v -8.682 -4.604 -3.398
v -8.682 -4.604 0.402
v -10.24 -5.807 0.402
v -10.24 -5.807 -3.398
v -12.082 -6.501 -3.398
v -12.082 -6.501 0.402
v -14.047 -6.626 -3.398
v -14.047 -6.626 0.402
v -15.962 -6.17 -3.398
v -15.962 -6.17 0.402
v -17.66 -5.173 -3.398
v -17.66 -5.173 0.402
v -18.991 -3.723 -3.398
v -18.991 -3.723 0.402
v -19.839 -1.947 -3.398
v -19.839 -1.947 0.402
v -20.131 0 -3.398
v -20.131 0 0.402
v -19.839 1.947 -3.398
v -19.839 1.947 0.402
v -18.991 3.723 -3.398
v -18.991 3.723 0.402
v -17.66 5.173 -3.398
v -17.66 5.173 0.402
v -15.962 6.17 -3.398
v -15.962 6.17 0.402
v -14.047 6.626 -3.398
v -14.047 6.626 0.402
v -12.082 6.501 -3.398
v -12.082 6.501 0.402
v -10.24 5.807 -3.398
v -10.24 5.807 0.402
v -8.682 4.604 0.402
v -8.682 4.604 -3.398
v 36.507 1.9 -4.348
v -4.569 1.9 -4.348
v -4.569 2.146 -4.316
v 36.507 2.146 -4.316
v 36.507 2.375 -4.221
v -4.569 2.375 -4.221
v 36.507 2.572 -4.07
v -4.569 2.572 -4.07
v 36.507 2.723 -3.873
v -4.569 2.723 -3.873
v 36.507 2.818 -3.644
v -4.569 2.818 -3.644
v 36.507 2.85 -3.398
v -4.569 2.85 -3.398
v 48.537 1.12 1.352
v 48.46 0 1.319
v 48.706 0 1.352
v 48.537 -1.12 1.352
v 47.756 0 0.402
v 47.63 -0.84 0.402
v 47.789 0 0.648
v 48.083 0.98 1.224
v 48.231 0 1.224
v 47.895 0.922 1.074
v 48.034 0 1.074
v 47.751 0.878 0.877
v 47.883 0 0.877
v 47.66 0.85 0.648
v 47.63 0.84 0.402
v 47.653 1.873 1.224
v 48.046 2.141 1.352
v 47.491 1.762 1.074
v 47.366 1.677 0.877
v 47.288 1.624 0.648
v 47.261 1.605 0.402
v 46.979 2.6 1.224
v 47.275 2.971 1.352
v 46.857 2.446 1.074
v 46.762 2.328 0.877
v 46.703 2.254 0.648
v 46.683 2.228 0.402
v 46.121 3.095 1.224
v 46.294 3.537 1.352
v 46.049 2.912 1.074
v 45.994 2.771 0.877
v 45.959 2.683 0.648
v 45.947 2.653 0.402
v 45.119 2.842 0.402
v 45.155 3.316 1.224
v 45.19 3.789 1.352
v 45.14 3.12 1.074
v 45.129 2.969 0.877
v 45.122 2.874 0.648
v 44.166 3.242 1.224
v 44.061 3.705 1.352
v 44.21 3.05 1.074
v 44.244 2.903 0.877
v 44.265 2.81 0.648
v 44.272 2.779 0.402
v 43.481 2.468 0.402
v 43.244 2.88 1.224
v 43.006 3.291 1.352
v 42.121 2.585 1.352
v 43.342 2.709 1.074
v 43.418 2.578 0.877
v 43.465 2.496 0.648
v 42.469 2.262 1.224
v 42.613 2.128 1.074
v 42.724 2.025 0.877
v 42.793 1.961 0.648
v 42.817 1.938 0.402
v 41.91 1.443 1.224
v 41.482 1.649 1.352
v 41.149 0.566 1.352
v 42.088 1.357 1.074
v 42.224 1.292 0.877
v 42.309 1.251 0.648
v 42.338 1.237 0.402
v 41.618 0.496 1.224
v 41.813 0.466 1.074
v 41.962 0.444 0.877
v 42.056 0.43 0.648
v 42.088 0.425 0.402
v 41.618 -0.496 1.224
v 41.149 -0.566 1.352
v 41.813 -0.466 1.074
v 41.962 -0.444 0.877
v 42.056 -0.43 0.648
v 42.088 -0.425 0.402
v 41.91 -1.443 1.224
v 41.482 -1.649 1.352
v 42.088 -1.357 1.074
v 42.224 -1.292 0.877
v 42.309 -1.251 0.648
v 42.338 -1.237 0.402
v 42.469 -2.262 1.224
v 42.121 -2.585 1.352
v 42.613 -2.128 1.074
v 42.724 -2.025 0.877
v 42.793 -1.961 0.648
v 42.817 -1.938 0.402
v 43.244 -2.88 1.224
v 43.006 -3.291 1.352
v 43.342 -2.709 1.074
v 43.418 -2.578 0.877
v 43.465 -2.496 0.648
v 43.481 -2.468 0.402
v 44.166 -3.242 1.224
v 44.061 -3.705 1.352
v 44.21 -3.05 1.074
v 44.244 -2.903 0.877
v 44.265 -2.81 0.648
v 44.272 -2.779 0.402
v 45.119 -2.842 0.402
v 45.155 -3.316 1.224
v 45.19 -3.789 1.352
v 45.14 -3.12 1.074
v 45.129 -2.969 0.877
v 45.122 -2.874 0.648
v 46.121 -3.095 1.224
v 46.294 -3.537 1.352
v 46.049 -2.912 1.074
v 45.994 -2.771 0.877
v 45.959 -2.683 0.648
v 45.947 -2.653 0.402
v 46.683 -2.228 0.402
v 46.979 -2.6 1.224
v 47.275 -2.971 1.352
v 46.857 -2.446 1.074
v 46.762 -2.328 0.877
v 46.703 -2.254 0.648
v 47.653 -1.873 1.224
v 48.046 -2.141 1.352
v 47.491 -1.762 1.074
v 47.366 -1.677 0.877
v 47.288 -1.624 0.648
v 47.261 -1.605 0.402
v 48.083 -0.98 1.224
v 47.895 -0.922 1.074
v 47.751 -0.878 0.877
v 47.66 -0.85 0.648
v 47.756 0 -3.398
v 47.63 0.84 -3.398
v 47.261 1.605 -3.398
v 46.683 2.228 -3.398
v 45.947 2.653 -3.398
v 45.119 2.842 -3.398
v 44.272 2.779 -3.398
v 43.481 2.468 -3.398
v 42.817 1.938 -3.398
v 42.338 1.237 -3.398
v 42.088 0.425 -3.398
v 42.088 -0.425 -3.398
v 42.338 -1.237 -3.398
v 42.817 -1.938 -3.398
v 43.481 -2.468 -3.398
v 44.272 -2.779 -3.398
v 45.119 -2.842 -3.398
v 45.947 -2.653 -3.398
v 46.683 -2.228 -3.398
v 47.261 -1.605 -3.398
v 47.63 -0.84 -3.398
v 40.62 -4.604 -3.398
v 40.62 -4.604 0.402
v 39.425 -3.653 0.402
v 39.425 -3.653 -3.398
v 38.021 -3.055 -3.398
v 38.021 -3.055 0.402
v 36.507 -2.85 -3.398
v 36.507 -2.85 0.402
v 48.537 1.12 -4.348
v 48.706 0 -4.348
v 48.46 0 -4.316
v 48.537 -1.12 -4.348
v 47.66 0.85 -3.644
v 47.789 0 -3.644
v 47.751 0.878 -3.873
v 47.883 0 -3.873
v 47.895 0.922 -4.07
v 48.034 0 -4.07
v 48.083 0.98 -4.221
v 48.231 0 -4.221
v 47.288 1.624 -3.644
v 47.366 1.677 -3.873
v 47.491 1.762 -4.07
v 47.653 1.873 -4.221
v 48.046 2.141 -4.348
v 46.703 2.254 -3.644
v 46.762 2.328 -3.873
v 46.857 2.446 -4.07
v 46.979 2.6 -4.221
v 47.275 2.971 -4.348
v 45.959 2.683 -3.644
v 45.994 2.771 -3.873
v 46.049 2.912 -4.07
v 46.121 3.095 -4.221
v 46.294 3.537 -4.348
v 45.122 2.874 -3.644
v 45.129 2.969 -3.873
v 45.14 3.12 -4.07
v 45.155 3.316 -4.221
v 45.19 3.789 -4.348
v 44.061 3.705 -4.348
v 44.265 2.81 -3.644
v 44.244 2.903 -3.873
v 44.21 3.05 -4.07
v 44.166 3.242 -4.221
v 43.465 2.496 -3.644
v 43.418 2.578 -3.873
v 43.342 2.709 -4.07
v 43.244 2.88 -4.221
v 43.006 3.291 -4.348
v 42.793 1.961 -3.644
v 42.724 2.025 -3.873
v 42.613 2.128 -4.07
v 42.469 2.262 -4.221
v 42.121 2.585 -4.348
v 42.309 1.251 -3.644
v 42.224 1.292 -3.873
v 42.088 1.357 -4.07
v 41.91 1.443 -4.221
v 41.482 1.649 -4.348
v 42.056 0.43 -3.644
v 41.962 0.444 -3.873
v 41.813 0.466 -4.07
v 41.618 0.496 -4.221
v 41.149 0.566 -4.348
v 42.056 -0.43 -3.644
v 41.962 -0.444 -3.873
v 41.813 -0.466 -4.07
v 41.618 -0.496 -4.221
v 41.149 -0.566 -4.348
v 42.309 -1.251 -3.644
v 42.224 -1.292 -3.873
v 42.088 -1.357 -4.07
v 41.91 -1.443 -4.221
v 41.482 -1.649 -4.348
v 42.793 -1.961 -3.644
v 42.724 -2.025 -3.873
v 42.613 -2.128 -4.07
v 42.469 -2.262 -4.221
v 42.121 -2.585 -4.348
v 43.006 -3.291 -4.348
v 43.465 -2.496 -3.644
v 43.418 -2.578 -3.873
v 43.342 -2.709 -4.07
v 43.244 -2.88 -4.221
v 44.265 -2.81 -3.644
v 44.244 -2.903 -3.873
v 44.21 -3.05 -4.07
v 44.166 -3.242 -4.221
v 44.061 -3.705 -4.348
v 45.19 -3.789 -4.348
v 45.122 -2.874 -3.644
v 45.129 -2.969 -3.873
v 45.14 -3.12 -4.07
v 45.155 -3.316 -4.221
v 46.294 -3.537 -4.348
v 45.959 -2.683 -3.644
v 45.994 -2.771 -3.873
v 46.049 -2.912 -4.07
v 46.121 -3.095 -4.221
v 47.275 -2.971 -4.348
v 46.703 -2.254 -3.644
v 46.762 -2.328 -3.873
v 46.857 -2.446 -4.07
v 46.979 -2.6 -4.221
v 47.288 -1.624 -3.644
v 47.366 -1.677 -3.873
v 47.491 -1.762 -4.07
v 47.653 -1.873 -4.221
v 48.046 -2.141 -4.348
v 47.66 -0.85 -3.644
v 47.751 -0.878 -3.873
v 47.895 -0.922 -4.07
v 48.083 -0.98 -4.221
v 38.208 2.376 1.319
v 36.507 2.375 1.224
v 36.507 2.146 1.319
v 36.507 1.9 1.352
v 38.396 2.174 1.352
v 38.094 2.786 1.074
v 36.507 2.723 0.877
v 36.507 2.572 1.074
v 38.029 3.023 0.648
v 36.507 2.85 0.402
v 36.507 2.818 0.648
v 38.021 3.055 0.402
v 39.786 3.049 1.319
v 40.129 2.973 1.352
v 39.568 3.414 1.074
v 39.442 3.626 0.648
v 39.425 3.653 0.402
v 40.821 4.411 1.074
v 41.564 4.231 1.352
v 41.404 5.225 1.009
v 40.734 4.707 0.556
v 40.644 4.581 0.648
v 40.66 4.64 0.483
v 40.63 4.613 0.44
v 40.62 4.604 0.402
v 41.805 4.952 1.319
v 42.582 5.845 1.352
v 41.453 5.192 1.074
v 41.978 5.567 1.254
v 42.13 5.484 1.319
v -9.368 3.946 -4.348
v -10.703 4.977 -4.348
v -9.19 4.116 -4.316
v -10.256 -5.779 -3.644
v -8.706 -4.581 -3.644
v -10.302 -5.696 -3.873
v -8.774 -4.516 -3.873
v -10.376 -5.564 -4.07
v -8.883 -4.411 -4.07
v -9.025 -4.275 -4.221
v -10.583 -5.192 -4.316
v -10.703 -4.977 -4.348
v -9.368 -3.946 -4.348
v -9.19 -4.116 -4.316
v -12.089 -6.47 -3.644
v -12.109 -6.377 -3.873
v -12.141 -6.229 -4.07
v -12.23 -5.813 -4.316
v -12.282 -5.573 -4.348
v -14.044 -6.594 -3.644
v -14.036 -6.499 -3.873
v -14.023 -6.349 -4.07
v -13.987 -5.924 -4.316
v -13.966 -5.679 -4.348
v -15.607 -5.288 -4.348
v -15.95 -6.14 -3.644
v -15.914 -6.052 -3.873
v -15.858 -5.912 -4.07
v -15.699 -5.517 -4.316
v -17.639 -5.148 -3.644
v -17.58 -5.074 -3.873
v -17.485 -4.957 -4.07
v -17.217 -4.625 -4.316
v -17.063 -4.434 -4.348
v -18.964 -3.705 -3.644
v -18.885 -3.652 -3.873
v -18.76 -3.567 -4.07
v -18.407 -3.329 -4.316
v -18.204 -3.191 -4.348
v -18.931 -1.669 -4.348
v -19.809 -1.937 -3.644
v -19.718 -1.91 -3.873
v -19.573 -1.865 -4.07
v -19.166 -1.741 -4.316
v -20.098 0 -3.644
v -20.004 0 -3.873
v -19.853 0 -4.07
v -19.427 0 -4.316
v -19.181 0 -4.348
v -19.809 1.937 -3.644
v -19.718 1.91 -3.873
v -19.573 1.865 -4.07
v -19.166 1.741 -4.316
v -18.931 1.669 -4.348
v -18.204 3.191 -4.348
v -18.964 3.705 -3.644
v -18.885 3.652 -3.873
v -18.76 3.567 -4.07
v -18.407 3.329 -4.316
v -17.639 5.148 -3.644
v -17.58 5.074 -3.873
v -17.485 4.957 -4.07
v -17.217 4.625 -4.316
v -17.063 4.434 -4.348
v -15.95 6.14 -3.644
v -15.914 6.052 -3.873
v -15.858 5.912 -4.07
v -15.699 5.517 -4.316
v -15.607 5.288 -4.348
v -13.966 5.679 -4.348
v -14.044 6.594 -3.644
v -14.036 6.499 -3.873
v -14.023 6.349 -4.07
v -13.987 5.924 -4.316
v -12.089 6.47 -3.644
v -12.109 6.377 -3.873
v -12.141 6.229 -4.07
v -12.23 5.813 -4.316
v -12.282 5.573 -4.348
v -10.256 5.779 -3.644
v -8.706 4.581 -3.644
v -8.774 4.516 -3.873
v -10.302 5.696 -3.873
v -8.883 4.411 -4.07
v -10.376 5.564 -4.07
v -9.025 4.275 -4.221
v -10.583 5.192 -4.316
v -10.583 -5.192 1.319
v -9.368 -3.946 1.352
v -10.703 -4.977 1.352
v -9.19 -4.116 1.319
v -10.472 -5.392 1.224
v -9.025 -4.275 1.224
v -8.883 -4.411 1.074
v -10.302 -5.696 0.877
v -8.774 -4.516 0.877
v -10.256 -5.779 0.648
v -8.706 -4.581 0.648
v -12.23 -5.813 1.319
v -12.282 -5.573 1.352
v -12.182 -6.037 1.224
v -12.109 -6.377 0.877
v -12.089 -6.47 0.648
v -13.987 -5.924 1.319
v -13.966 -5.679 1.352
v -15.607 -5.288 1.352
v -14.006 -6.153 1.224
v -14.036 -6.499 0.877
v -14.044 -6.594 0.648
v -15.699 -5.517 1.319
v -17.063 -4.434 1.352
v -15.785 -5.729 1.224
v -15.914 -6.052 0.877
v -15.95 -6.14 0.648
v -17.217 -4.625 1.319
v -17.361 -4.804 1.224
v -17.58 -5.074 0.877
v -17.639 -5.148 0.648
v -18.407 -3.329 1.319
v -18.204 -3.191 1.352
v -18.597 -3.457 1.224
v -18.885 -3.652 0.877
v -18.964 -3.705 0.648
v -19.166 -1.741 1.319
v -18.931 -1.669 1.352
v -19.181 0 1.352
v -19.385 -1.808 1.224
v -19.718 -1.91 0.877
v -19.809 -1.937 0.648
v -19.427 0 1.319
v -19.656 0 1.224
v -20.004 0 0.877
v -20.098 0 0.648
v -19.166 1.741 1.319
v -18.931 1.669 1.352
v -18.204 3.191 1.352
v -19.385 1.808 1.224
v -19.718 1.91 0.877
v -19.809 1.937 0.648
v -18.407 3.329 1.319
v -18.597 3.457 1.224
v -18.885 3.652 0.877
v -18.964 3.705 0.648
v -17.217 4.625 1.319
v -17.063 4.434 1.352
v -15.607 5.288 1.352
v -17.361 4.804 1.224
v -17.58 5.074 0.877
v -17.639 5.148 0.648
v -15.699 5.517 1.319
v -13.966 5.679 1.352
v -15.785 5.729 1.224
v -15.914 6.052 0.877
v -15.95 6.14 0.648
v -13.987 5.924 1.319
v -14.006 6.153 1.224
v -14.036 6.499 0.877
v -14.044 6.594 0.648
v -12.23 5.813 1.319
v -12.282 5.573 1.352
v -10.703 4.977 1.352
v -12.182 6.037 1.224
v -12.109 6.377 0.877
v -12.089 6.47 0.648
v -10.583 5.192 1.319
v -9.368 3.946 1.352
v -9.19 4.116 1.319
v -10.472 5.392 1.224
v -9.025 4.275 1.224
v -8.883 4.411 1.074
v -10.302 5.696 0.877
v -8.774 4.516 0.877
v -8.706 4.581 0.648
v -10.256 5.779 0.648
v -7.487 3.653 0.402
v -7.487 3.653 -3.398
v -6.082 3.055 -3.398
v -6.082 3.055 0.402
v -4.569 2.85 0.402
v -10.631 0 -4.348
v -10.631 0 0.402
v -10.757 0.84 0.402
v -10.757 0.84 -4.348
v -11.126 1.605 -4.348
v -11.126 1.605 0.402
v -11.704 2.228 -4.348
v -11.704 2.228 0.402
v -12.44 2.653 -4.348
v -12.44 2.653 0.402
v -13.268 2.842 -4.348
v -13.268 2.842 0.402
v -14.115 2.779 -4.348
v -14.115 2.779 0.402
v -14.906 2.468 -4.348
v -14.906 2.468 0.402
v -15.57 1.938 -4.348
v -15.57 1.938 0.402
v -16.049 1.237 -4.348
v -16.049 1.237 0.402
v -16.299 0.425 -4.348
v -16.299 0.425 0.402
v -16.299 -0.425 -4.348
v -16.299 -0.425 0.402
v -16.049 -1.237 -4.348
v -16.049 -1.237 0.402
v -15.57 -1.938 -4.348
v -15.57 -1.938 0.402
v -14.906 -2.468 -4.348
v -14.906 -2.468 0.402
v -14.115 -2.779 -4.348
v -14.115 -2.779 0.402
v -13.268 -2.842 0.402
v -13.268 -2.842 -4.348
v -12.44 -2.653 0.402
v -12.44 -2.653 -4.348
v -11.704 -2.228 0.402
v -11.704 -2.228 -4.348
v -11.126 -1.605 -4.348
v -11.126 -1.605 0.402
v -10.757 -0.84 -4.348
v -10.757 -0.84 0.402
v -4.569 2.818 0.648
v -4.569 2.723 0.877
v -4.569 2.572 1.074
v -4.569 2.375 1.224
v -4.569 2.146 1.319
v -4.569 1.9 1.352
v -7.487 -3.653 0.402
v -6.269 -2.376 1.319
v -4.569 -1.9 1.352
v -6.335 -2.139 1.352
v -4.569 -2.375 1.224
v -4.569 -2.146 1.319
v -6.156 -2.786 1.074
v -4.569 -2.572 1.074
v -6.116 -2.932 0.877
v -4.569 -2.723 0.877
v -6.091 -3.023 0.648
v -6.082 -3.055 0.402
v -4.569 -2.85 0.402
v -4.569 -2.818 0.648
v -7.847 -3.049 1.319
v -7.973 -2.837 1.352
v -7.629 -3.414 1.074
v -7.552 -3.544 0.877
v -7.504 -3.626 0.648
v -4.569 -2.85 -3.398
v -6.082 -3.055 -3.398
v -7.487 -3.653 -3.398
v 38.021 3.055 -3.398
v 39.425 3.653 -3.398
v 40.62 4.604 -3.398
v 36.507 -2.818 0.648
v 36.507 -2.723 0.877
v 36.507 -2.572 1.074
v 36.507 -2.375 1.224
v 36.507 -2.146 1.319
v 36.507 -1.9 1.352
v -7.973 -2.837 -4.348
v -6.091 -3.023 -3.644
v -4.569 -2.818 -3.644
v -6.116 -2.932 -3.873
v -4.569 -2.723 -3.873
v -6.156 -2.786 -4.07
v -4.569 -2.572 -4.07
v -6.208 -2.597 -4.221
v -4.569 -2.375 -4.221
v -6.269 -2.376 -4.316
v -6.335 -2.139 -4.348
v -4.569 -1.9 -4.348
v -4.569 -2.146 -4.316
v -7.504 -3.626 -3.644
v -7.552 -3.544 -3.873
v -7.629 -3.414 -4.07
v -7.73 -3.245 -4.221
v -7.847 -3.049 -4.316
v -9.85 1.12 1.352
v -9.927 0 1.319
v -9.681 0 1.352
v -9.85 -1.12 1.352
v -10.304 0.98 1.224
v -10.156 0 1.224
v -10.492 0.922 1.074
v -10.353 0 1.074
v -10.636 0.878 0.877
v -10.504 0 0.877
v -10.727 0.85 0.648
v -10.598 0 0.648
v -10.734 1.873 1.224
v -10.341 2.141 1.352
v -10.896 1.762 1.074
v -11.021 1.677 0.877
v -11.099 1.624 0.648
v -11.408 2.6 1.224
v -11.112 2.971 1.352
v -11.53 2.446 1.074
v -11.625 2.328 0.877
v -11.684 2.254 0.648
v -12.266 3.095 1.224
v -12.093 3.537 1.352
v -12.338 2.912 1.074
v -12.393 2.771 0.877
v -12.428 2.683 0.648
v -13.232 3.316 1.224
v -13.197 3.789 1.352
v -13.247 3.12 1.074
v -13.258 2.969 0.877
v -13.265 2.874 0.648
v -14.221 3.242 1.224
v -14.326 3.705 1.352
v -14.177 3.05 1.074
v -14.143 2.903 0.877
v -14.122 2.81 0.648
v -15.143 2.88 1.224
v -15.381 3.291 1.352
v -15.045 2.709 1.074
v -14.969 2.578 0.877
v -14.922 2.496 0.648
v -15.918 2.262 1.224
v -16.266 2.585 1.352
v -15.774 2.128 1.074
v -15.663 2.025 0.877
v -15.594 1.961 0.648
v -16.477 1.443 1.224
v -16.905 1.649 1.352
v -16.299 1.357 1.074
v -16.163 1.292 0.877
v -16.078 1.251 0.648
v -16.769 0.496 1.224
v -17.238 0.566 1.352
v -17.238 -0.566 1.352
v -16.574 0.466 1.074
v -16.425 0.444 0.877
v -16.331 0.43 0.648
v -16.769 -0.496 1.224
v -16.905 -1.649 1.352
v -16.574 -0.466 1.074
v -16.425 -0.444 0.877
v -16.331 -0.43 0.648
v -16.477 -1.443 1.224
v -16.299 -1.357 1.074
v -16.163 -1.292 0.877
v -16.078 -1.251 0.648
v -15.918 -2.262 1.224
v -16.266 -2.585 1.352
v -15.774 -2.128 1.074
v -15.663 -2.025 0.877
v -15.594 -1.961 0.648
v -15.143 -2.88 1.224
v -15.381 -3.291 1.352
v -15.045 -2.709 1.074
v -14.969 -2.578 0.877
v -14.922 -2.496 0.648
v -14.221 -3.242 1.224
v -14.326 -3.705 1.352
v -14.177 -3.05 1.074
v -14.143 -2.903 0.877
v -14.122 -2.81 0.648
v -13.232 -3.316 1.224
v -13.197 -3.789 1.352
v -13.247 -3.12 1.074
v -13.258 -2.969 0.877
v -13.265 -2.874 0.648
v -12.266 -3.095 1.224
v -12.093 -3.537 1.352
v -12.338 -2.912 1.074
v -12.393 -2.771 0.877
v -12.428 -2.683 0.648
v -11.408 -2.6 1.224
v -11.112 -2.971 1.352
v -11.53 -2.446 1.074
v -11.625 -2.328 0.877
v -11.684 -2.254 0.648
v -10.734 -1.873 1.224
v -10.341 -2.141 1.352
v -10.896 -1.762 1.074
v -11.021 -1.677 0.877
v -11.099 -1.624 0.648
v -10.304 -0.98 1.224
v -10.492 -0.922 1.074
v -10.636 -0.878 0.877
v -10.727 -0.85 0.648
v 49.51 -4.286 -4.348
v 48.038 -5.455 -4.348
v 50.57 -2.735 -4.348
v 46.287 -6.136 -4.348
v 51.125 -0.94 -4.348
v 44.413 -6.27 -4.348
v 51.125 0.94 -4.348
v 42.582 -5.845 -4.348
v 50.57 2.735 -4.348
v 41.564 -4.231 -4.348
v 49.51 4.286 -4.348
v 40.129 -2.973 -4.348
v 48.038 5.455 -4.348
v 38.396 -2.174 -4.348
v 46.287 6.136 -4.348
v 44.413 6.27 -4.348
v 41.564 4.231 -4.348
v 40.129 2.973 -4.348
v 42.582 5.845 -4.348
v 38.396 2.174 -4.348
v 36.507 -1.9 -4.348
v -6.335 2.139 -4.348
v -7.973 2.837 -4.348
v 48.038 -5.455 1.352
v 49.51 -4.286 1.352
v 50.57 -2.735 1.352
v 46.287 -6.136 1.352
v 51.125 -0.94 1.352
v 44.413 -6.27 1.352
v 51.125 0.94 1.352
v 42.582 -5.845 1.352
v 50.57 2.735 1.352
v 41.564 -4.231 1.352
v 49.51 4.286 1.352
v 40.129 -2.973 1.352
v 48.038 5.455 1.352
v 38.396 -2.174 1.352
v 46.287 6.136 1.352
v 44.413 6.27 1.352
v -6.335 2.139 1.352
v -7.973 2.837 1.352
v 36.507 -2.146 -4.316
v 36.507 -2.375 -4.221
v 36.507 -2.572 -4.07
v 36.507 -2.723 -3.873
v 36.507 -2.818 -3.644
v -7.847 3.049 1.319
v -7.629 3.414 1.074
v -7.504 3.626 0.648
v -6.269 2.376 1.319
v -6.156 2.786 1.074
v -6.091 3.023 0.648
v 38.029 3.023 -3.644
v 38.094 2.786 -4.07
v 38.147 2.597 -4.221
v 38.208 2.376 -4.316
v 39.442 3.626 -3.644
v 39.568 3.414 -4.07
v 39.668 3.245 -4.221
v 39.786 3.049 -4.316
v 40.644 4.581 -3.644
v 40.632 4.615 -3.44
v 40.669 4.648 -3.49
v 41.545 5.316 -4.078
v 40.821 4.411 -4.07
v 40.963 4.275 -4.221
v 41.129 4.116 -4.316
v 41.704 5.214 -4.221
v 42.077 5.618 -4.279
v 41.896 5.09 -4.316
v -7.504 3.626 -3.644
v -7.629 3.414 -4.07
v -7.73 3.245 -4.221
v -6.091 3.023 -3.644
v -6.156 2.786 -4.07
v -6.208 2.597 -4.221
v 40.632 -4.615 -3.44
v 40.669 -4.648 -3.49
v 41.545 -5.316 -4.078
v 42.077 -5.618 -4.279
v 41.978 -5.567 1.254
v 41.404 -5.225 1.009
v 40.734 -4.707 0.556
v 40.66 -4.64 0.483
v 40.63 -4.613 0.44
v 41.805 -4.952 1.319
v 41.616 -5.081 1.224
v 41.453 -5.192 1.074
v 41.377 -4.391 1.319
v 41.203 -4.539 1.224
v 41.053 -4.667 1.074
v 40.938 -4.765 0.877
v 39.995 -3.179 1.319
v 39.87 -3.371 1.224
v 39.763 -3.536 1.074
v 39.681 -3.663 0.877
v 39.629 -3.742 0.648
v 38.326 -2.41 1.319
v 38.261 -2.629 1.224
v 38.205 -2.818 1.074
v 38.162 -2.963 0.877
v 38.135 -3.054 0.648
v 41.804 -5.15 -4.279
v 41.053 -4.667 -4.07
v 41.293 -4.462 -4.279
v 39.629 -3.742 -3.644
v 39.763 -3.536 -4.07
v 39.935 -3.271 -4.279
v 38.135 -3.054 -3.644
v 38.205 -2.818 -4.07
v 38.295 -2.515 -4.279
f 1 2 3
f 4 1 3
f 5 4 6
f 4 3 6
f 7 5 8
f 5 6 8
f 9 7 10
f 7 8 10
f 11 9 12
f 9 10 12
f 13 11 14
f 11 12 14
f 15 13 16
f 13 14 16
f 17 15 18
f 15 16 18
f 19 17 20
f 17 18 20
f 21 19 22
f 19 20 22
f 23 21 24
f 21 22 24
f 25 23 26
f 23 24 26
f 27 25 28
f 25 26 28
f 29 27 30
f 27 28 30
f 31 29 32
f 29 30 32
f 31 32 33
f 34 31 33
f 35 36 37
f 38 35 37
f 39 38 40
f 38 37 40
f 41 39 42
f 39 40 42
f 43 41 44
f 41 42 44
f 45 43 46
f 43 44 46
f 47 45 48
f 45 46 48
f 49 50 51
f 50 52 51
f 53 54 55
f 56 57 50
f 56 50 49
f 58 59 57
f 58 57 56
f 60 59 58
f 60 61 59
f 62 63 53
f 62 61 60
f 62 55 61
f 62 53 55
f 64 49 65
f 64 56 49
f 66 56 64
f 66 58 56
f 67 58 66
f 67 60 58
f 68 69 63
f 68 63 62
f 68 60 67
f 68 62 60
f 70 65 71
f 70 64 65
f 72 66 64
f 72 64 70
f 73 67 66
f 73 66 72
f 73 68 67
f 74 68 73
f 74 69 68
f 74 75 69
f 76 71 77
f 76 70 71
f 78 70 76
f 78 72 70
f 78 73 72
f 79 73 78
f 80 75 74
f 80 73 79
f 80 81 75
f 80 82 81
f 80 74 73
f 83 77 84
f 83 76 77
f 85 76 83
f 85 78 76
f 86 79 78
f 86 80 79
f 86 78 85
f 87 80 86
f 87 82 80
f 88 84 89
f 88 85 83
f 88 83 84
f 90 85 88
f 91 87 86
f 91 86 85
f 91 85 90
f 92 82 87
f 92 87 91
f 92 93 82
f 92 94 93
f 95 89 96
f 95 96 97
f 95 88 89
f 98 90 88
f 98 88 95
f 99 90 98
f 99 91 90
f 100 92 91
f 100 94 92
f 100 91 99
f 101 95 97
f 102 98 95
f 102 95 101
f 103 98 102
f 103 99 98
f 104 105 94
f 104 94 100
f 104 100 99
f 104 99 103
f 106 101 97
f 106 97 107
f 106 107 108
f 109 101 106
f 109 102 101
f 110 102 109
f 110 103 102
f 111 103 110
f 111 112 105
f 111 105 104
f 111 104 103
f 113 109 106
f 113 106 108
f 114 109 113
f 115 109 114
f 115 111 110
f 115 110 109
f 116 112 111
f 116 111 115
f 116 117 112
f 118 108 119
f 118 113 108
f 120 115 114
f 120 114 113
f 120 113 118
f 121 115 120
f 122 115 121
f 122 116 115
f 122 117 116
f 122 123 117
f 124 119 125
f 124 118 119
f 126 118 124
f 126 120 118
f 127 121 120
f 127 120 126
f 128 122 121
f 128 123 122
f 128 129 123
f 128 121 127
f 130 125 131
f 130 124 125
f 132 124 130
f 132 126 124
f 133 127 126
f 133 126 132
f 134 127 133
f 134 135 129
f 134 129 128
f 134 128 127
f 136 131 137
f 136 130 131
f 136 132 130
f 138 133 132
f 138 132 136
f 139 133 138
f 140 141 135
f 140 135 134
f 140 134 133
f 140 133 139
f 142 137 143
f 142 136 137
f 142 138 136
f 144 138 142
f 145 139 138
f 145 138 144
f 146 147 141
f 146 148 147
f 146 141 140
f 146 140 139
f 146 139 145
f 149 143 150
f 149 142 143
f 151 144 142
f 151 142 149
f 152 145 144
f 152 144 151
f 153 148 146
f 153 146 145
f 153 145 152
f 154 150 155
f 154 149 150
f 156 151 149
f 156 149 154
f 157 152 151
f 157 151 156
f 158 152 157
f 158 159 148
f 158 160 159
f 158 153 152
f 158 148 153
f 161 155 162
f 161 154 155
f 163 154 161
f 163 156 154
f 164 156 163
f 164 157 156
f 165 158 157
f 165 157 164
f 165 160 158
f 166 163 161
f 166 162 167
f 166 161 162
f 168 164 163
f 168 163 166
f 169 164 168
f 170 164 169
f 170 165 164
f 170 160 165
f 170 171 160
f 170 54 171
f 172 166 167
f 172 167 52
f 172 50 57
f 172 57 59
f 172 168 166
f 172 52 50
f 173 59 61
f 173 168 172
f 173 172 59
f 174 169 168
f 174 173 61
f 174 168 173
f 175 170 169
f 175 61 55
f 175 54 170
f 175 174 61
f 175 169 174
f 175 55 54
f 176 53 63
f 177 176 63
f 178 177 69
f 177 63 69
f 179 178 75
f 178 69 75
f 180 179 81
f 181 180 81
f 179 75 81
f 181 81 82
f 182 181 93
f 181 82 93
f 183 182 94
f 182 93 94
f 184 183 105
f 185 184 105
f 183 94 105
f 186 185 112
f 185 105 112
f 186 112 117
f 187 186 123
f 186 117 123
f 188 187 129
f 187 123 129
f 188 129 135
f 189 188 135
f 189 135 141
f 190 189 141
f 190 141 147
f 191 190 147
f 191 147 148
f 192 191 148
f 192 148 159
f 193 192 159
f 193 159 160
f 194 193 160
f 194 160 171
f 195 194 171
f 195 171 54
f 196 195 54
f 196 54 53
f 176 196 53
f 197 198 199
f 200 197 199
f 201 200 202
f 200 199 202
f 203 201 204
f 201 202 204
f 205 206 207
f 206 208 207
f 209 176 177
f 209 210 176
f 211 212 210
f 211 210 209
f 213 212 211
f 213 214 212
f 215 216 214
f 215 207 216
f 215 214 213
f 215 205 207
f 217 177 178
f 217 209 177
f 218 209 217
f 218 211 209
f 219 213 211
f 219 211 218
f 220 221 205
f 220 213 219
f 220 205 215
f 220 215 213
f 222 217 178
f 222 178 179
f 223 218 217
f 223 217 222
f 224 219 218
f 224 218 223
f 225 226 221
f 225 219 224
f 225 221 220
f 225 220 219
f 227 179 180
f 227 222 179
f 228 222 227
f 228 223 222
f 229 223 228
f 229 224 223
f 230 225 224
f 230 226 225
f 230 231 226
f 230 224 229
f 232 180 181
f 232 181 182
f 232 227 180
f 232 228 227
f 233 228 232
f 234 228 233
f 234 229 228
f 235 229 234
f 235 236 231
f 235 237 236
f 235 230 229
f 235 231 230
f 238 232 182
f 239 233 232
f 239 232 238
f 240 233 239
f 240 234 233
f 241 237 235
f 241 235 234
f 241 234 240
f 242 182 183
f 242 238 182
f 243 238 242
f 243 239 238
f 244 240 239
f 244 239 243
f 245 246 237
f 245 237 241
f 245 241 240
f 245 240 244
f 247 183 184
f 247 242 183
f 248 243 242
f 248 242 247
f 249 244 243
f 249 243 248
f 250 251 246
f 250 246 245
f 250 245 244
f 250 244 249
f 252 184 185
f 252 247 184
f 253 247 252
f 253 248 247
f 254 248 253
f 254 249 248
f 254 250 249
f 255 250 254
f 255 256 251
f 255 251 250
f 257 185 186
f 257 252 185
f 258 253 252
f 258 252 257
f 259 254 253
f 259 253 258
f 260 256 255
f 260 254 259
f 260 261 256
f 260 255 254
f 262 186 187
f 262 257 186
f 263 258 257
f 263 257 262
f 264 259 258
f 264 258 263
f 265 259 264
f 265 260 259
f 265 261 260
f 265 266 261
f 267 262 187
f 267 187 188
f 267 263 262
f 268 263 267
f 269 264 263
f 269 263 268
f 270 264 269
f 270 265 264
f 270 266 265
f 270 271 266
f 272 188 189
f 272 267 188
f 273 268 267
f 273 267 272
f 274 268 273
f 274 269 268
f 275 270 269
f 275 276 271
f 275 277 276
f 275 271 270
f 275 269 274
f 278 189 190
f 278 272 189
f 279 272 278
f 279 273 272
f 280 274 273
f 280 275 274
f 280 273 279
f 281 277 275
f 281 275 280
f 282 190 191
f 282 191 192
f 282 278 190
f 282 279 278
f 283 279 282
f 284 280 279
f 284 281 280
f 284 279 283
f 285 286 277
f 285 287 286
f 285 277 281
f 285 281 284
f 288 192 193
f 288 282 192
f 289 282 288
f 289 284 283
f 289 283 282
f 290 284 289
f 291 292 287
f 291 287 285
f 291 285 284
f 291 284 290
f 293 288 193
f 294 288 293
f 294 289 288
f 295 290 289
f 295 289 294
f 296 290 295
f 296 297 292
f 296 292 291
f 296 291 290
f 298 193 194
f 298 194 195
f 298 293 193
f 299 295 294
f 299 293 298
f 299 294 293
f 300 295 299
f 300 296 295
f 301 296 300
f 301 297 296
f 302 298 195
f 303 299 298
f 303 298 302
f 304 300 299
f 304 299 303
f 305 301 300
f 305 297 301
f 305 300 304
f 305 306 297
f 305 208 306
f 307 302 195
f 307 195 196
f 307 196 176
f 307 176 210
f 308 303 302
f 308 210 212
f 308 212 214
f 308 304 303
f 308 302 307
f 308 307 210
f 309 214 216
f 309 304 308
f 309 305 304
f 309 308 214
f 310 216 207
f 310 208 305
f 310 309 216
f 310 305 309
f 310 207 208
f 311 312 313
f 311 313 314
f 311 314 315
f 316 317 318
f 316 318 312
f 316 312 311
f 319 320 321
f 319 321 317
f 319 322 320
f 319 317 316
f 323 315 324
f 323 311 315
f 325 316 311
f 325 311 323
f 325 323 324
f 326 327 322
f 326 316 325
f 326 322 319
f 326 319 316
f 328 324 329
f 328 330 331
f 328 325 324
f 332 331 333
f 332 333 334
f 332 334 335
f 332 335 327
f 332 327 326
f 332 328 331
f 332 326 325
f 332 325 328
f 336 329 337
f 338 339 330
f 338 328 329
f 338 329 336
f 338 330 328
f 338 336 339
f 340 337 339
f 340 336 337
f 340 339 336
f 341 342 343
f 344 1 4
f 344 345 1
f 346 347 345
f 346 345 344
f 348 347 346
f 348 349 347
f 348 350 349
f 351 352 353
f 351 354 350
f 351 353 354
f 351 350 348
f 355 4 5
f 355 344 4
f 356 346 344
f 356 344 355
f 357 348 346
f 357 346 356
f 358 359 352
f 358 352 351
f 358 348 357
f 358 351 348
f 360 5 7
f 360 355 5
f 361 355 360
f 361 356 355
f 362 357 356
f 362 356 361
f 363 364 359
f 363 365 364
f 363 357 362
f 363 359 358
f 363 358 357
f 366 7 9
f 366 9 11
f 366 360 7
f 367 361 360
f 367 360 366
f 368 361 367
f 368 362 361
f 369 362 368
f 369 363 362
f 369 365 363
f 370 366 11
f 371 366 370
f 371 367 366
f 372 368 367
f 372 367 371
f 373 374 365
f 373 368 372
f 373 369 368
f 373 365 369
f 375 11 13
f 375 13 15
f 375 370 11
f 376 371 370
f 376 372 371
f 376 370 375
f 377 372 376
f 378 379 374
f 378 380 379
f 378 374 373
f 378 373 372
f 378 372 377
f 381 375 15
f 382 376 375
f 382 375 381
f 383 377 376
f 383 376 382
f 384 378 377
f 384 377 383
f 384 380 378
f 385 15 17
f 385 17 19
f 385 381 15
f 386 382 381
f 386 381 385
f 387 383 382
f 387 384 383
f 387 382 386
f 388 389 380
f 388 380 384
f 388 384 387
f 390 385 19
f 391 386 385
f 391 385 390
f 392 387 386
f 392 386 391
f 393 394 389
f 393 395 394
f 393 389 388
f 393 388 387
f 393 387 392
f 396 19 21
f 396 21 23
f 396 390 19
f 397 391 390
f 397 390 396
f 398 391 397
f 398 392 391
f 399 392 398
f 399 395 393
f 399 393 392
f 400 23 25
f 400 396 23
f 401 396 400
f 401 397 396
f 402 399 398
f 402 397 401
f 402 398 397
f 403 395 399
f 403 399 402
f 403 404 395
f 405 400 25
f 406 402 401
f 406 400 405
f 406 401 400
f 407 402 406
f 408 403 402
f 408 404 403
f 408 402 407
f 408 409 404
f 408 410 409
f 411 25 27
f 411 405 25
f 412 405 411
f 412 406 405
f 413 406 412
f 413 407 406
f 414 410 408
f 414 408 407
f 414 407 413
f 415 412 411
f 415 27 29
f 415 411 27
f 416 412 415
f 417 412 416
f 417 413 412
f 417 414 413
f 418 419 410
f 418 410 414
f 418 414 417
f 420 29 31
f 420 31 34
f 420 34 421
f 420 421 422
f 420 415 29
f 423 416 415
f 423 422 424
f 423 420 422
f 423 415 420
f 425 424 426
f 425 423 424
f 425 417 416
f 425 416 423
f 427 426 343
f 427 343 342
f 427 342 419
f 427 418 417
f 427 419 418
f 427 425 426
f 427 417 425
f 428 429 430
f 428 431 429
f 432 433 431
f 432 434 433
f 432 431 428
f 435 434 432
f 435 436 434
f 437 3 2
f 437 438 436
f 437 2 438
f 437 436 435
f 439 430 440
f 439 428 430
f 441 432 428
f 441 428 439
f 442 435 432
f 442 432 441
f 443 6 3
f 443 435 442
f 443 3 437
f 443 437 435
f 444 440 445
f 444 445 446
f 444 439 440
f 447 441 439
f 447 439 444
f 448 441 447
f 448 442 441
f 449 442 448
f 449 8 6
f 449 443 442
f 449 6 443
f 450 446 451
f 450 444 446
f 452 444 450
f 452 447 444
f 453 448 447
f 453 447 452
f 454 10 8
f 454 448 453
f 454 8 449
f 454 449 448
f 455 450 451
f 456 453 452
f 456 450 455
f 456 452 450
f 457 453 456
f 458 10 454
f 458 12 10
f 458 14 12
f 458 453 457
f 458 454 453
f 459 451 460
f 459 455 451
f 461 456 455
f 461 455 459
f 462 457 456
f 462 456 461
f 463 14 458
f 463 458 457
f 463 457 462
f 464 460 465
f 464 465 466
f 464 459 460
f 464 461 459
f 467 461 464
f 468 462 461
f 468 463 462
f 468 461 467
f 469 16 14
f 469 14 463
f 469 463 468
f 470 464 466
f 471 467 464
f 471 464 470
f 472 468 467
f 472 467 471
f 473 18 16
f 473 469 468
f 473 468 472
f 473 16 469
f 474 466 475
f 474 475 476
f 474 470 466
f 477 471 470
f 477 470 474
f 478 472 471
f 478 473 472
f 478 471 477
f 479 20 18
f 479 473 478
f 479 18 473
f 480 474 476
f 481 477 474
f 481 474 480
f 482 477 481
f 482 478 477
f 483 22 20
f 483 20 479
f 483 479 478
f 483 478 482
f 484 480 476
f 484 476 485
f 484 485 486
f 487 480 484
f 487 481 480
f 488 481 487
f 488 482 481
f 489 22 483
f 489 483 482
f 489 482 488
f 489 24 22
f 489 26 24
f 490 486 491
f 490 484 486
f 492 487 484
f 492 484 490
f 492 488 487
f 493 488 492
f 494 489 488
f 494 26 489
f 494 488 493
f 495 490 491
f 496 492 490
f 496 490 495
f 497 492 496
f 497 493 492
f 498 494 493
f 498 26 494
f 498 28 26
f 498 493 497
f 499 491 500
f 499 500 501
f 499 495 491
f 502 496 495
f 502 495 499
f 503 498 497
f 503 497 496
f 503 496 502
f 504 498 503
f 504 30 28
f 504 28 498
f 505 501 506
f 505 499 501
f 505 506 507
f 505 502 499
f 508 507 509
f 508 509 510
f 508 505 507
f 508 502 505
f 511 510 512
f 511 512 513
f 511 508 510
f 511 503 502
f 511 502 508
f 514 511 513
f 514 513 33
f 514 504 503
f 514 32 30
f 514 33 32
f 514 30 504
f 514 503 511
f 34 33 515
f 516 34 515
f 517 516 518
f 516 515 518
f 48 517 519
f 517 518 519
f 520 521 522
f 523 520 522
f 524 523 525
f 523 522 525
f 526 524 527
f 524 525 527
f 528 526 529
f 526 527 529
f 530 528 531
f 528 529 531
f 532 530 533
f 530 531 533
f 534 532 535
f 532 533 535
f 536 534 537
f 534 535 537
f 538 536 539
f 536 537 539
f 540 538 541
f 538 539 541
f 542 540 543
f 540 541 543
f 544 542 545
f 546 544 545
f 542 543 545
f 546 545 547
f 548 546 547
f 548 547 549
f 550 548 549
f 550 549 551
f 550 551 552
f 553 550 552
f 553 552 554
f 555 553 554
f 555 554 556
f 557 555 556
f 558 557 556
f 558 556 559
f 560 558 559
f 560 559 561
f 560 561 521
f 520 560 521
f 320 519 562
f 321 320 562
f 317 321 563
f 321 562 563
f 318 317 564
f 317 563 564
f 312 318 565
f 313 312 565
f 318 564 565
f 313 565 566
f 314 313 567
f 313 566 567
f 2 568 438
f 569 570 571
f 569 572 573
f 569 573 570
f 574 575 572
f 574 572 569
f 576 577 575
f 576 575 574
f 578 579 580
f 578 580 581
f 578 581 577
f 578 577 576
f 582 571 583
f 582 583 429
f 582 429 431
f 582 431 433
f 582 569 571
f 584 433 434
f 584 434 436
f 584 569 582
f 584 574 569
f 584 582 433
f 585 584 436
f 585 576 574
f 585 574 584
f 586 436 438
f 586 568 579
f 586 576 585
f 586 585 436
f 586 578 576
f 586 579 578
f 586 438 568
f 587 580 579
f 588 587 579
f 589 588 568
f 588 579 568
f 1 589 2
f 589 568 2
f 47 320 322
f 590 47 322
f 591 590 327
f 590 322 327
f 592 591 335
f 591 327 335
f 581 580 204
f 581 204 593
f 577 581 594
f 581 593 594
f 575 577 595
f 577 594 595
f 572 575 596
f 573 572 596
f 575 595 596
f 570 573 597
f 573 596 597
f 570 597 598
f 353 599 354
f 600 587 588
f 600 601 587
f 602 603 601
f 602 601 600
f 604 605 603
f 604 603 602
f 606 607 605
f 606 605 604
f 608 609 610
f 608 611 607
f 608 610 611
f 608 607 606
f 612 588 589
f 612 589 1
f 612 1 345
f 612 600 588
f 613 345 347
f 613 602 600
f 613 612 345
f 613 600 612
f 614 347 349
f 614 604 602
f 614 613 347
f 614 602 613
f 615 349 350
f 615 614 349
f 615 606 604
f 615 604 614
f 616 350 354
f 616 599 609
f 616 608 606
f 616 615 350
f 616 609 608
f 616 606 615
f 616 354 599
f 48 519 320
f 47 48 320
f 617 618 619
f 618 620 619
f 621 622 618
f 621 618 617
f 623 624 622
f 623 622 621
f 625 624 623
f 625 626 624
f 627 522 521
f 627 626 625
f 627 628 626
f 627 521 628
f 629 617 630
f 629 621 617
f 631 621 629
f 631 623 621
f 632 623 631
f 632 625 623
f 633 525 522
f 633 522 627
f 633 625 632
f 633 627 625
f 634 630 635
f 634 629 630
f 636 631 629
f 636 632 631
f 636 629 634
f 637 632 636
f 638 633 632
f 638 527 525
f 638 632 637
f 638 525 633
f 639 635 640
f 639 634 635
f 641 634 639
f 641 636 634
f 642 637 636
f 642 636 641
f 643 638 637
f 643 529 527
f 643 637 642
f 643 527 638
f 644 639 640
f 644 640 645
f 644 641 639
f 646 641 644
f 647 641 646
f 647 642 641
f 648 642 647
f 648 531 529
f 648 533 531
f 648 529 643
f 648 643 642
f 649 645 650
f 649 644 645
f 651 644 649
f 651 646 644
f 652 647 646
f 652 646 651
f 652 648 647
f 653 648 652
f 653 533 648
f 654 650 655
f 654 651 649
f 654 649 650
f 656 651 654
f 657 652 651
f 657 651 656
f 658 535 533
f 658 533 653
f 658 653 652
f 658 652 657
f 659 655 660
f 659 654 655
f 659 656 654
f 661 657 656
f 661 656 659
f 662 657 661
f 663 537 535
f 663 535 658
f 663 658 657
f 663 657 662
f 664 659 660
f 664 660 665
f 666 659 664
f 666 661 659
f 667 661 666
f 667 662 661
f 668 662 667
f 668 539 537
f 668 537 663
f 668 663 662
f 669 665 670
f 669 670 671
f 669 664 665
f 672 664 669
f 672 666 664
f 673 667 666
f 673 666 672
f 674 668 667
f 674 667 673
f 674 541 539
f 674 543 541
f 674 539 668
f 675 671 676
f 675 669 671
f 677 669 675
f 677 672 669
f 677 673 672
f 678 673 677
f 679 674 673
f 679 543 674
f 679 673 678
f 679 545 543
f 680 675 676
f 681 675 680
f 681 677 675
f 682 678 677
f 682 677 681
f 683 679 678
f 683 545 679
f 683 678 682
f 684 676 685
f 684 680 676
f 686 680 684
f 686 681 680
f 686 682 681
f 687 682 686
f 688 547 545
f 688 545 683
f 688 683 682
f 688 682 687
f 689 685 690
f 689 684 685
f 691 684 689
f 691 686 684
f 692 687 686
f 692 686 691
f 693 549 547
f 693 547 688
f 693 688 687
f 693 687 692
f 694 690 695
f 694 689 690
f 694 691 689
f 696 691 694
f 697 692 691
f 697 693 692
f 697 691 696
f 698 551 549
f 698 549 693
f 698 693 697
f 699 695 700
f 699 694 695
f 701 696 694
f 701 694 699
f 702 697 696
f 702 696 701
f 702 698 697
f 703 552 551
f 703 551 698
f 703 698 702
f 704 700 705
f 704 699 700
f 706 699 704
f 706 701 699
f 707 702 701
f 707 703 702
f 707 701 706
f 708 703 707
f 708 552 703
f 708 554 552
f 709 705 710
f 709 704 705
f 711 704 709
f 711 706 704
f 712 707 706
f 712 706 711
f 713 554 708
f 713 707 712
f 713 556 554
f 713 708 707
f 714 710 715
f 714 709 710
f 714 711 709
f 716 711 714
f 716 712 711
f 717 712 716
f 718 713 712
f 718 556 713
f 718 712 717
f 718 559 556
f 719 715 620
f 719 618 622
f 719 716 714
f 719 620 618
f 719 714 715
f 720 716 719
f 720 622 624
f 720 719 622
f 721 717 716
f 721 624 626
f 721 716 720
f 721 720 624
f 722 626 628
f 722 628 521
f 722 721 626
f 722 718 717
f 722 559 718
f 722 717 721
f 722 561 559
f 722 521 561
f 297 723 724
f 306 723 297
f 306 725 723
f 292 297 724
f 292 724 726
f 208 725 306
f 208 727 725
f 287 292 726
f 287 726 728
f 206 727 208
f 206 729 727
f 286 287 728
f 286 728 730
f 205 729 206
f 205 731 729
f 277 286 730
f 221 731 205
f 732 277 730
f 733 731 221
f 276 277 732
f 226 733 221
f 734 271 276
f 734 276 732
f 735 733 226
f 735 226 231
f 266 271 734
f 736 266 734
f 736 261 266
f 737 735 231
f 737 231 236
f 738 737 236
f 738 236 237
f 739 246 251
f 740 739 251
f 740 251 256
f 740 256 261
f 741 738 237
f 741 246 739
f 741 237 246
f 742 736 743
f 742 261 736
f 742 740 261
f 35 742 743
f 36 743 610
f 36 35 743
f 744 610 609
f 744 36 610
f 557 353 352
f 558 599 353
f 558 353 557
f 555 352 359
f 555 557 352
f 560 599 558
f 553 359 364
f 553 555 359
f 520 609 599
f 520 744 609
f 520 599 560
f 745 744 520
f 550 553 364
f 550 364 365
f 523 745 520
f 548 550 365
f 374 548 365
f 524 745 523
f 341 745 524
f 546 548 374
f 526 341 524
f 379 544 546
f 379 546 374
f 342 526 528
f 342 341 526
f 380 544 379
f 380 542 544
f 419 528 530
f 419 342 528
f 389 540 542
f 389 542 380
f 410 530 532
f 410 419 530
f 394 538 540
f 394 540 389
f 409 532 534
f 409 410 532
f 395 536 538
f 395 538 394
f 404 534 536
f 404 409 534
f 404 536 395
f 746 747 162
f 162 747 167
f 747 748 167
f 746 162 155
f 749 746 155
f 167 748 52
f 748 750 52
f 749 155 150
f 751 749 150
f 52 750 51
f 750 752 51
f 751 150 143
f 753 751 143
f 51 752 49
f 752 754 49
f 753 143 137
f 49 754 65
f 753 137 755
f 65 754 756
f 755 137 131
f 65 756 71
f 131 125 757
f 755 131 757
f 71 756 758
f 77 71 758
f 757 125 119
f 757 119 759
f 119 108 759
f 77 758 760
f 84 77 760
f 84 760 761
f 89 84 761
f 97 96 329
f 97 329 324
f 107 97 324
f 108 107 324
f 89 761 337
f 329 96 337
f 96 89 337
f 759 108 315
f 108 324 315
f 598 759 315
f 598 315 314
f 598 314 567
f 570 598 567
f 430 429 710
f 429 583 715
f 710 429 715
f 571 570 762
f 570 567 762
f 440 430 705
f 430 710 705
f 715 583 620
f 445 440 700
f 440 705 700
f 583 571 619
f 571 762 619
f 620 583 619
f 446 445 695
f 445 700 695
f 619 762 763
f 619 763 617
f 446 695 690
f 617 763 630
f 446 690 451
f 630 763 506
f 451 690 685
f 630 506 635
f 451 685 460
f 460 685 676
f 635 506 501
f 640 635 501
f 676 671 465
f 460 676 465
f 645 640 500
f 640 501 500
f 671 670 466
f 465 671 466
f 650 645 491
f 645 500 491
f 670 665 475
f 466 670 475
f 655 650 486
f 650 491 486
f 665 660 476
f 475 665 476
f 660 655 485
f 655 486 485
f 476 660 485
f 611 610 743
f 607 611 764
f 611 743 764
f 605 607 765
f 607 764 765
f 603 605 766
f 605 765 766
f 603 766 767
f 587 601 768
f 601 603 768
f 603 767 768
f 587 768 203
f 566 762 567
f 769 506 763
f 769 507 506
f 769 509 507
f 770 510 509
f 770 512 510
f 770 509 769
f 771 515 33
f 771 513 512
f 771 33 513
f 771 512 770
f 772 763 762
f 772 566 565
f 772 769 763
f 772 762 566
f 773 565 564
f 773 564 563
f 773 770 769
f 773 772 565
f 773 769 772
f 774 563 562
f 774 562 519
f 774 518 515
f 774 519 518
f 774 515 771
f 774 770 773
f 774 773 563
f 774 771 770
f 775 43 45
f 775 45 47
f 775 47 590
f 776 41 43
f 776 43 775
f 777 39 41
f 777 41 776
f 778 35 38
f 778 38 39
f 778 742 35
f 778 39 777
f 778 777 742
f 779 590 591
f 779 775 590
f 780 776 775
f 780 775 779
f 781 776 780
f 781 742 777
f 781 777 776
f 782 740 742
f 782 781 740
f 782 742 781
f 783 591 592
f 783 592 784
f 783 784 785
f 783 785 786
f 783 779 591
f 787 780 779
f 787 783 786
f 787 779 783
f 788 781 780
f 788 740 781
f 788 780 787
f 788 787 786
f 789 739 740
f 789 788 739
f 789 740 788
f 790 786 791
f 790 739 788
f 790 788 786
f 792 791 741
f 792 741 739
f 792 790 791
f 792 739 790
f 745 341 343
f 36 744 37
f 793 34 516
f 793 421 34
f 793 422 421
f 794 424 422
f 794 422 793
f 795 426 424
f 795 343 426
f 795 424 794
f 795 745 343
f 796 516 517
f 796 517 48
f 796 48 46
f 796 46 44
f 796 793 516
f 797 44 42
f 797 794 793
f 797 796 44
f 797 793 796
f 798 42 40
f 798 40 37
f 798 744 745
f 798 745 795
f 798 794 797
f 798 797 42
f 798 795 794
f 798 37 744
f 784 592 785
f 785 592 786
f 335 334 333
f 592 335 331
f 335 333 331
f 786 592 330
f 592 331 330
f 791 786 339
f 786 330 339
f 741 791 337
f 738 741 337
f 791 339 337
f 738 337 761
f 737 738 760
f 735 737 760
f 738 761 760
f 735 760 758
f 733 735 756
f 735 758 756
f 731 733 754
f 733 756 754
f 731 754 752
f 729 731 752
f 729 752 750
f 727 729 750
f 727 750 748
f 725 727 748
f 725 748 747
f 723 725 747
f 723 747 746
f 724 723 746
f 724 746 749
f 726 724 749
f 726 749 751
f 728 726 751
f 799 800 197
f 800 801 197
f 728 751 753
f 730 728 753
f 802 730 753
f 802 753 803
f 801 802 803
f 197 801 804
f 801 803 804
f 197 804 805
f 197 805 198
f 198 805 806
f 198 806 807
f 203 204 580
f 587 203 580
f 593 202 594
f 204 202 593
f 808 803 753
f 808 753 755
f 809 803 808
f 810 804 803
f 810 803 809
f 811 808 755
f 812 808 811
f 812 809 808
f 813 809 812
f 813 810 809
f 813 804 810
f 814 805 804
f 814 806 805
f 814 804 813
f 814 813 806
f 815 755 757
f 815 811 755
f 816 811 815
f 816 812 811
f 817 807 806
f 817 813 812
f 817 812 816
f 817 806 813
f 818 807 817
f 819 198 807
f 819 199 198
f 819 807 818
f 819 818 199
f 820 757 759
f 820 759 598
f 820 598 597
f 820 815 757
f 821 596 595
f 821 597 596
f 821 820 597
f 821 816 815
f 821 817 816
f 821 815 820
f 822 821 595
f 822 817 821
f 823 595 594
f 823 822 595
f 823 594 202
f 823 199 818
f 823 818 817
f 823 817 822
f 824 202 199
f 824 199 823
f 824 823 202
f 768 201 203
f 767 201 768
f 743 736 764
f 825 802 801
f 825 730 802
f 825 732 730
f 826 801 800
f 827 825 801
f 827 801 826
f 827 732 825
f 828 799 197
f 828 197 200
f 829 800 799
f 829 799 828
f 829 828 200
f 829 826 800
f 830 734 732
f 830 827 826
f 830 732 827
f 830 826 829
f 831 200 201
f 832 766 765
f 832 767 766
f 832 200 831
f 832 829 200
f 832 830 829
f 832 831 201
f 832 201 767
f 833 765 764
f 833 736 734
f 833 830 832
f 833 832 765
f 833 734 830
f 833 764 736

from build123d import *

# Parameters (mm, degrees)
SKETCH1_R           = 1.5
SKETCH1_R_2         = 1.500000000000004
BOSS_EXTRUDE1_DEPTH = 3
FILLET1_R           = 0.5
SCALE1_SCALE        = 1.9


with BuildPart() as part:
    # Sketch1 → Boss-Extrude1 (new body)
    with BuildSketch(Plane.XY):
        with BuildLine():
            Line((4.690415759823431, 1.5), (26.30958424017657, 1.5))
            ThreePointArc((26.30958424017657, 1.5), (27.486281051005673, 1.7404013669766005), (28.474391513941228, 2.4230769230769225))
            ThreePointArc((28.474391513941228, 2.4230769230769225), (34.04044882418204, 0), (28.474391513941228, -2.4230769230769225))
            ThreePointArc((28.474391513941228, -2.4230769230769225), (27.486281051005673, -1.7404013669766005), (26.30958424017657, -1.5))
            Line((26.30958424017657, -1.5), (4.690415759823431, -1.5))
            ThreePointArc((4.690415759823431, -1.5), (3.5137189489943266, -1.7404013669766005), (2.5256084860587706, -2.4230769230769234))
            ThreePointArc((2.5256084860587706, -2.4230769230769234), (-3.500000000000001, 4.3e-16), (2.5256084860587706, 2.4230769230769234))
            ThreePointArc((2.5256084860587706, 2.4230769230769234), (3.5137189489943266, 1.7404013669766005), (4.690415759823431, 1.5))
        make_face()
        Circle(SKETCH1_R, mode=Mode.SUBTRACT)
        with Locations((30.73, 0)):
            Circle(SKETCH1_R_2, mode=Mode.SUBTRACT)
    extrude(amount=-BOSS_EXTRUDE1_DEPTH)

    # Fillet1
    # the kernel refuses this fillet: 0.5 mm, written as the material it takes off along each edge
    with BuildSketch(Plane(origin=(-6e-17, 2.2e-16, 0), x_dir=(0.7216024245882201, -0.6923076923076922, 0), z_dir=(0.6923076923076922, 0.7216024245882201, 0))) as fillet1_piece_1:
        with BuildLine():
            CenterArc((3.5000000000000013 - FILLET1_R, FILLET1_R), FILLET1_R, 269.99999999999994, 90.00000000000006)
            Line((3.5000000000000013 - FILLET1_R, -6e-17), (3.5000000000000013, 0))
            Line((3.5000000000000013, 0), (3.5000000000000013, FILLET1_R))
        make_face()
    revolve(axis=Axis((-6e-17, 2.2e-16, 0), (0, 0, -1)), revolution_arc=272.37387707919373, mode=Mode.SUBTRACT)
    with BuildSketch(Plane(origin=(4.6904157598234315, 4.5, 0), x_dir=(-0.7216024245882201, -0.6923076923076921, 0), z_dir=(-0.6923076923076921, 0.7216024245882201, 0))) as fillet1_piece_2:
        with BuildLine():
            CenterArc((3 + FILLET1_R, -FILLET1_R), FILLET1_R, 89.99999999999994, 90.00000000000006)
            Line((3 + FILLET1_R, 6e-17), (3, 0))
            Line((3, 0), (2.9999999999999996, -FILLET1_R))
        make_face()
    revolve(axis=Axis((4.6904157598234315, 4.5, 0), (0, 0, 1)), revolution_arc=46.18693853959685, mode=Mode.SUBTRACT)
    with BuildSketch(Plane(origin=(4.690415759823431, 1.5, 0), x_dir=(0, 0, -1), z_dir=(1, 0, 0)), Plane(origin=(26.30958424017657, -1.5, 0), x_dir=(0, 0, -1), z_dir=(-1, 0, 0))) as fillet1_piece_3:
        with BuildLine():
            CenterArc((FILLET1_R, -FILLET1_R), FILLET1_R, 90, 90)
            Line((-6e-17, -FILLET1_R), (0, 0))
            Line((0, 0), (FILLET1_R, 0))
        make_face()
    extrude(amount=21.61916848035314, mode=Mode.SUBTRACT)
    with BuildSketch(Plane(origin=(26.309584240176566, 4.500000000000009, 0), x_dir=(1.18e-15, -1, 0), z_dir=(-1, -1.18e-15, 0))) as fillet1_piece_4:
        with BuildLine():
            CenterArc((3.000000000000009 + FILLET1_R, -FILLET1_R), FILLET1_R, 90, 90)
            Line((3.000000000000009 + FILLET1_R, 6e-17), (3.000000000000009, 0))
            Line((3.000000000000009, 0), (3.000000000000009, -FILLET1_R))
        make_face()
    revolve(axis=Axis((26.309584240176566, 4.500000000000009, 0), (0, 0, 1)), revolution_arc=70.06270514317328, mode=Mode.SUBTRACT)
    with BuildSketch(Plane(origin=(4.6904157598234315, 4.5, -3), x_dir=(-0.7216024245882201, -0.6923076923076921, 0), z_dir=(-0.6923076923076921, 0.7216024245882201, 0))) as fillet1_piece_5:
        with BuildLine():
            CenterArc((3 + FILLET1_R, FILLET1_R), FILLET1_R, 180, 90.00000000000006)
            Line((3 + FILLET1_R, 0), (3, 0))
            Line((3, 0), (2.9999999999999996, FILLET1_R))
        make_face()
    revolve(axis=Axis((4.6904157598234315, 4.5, -3), (0, 0, 1)), revolution_arc=46.18693853959685, mode=Mode.SUBTRACT)
    with BuildSketch(Plane(origin=(-6e-17, 2.2e-16, -3), x_dir=(0.7216024245882201, -0.6923076923076922, 0), z_dir=(0.6923076923076922, 0.7216024245882201, 0))) as fillet1_piece_6:
        with BuildLine():
            CenterArc((3.5000000000000013 - FILLET1_R, -FILLET1_R), FILLET1_R, 0, 90.00000000000006)
            Line((3.5000000000000013 - FILLET1_R, 0), (3.5000000000000013, 0))
            Line((3.5000000000000013, 0), (3.5000000000000013, -FILLET1_R))
        make_face()
    revolve(axis=Axis((-6e-17, 2.2e-16, -3), (0, 0, -1)), revolution_arc=272.37387707919373, mode=Mode.SUBTRACT)
    with BuildSketch(Plane(origin=(4.6904157598234315, -4.500000000000001, -3), x_dir=(-3e-16, 1, 0), z_dir=(1, 3e-16, 0))) as fillet1_piece_7:
        with BuildLine():
            CenterArc((3.0000000000000013 + FILLET1_R, FILLET1_R), FILLET1_R, 180, 90)
            Line((3.0000000000000013 + FILLET1_R, 0), (3.0000000000000013, 0))
            Line((3.0000000000000013, 0), (3.0000000000000013, FILLET1_R))
        make_face()
    revolve(axis=Axis((4.6904157598234315, -4.500000000000001, -3), (0, 0, 1)), revolution_arc=46.186938539596845, mode=Mode.SUBTRACT)
    with BuildSketch(Plane(origin=(0, 0, 0), x_dir=(1, 0, 0), z_dir=(0, -1, 0))) as fillet1_piece_8:
        with BuildLine():
            CenterArc((1.5 + FILLET1_R, -FILLET1_R), FILLET1_R, 90, 90)
            Line((1.5 + FILLET1_R, 6e-17), (1.5, 0))
            Line((1.5, 0), (1.5, -FILLET1_R))
        make_face()
    revolve(axis=Axis((0, 0, 0), (0, 0, 1)), mode=Mode.SUBTRACT)
    with BuildSketch(Plane(origin=(26.30958424017657, -1.5, -3), x_dir=(0, 0, 1), z_dir=(-1, 0, 0)), Plane(origin=(4.690415759823431, 1.5, -3), x_dir=(0, 0, 1), z_dir=(1, 0, 0))) as fillet1_piece_9:
        with BuildLine():
            CenterArc((FILLET1_R, FILLET1_R), FILLET1_R, 180, 90)
            Line((0, FILLET1_R), (0, 0))
            Line((0, 0), (FILLET1_R, 0))
        make_face()
    extrude(amount=21.61916848035314, mode=Mode.SUBTRACT)
    with BuildSketch(Plane(origin=(30.73, 0, -3), x_dir=(1, 0, 0), z_dir=(0, -1, 0))) as fillet1_piece_10:
        with BuildLine():
            CenterArc((1.5000000000000036 + FILLET1_R, FILLET1_R), FILLET1_R, 180, 90)
            Line((1.5000000000000036 + FILLET1_R, 0), (1.5000000000000036, 0))
            Line((1.5000000000000036, 0), (1.5000000000000036, FILLET1_R))
        make_face()
    revolve(axis=Axis((30.73, 0, -3), (0, 0, 1)), mode=Mode.SUBTRACT)
    with BuildSketch(Plane(origin=(30.73, 0, 0), x_dir=(1, 0, 0), z_dir=(0, -1, 0))) as fillet1_piece_11:
        with BuildLine():
            CenterArc((1.5000000000000036 + FILLET1_R, -FILLET1_R), FILLET1_R, 90, 90)
            Line((1.5000000000000036 + FILLET1_R, 6e-17), (1.5000000000000036, 0))
            Line((1.5000000000000036, 0), (1.5000000000000036, -FILLET1_R))
        make_face()
    revolve(axis=Axis((30.73, 0, 0), (0, 0, 1)), mode=Mode.SUBTRACT)
    with BuildSketch(Plane(origin=(26.309584240176562, -4.500000000000011, -3), x_dir=(0.9400663686370947, 0.3409915285714087, 0), z_dir=(0.3409915285714087, -0.9400663686370947, 0))) as fillet1_piece_12:
        with BuildLine():
            CenterArc((3.0000000000000124 + FILLET1_R, FILLET1_R), FILLET1_R, 180, 90.00000000000023)
            Line((3.0000000000000124 + FILLET1_R, 0), (3.0000000000000124, 0))
            Line((3.0000000000000124, 0), (3.00000000000001, FILLET1_R))
        make_face()
    revolve(axis=Axis((26.309584240176562, -4.500000000000011, -3), (0, 0, 1)), revolution_arc=70.0627051431732, mode=Mode.SUBTRACT)
    with BuildSketch(Plane(origin=(26.309584240176566, 4.500000000000009, -3), x_dir=(1.18e-15, -1, 0), z_dir=(-1, -1.18e-15, 0))) as fillet1_piece_13:
        with BuildLine():
            CenterArc((3.000000000000009 + FILLET1_R, FILLET1_R), FILLET1_R, 180, 90)
            Line((3.000000000000009 + FILLET1_R, 0), (3.000000000000009, 0))
            Line((3.000000000000009, 0), (3.000000000000009, FILLET1_R))
        make_face()
    revolve(axis=Axis((26.309584240176566, 4.500000000000009, -3), (0, 0, 1)), revolution_arc=70.06270514317328, mode=Mode.SUBTRACT)
    with BuildSketch(Plane(origin=(26.309584240176562, -4.500000000000011, 0), x_dir=(0.9400663686370947, 0.34099152857140885, 0), z_dir=(0.34099152857140885, -0.9400663686370947, 0))) as fillet1_piece_14:
        with BuildLine():
            CenterArc((3.000000000000013 + FILLET1_R, -FILLET1_R), FILLET1_R, 89.99999999999969, 90.00000000000034)
            Line((3.000000000000013 + FILLET1_R, 6e-17), (3.000000000000013, 0))
            Line((3.000000000000013, 0), (3.00000000000001, -FILLET1_R))
        make_face()
    revolve(axis=Axis((26.309584240176562, -4.500000000000011, 0), (0, 0, 1)), revolution_arc=70.0627051431732, mode=Mode.SUBTRACT)
    with BuildSketch(Plane(origin=(4.6904157598234315, -4.500000000000001, 0), x_dir=(-3e-16, 1, 0), z_dir=(1, 3e-16, 0))) as fillet1_piece_15:
        with BuildLine():
            CenterArc((3.0000000000000013 + FILLET1_R, -FILLET1_R), FILLET1_R, 90, 90)
            Line((3.0000000000000013 + FILLET1_R, 6e-17), (3.0000000000000013, 0))
            Line((3.0000000000000013, 0), (3.0000000000000013, -FILLET1_R))
        make_face()
    revolve(axis=Axis((4.6904157598234315, -4.500000000000001, 0), (0, 0, 1)), revolution_arc=46.186938539596845, mode=Mode.SUBTRACT)


with BuildPart() as part_1:
    # Scale1: scaled about (14.97872549, -2.3e-08, -1.501949576)
    add(part.part.scale(SCALE1_SCALE).moved(Location((-13.480852940999998, 2.07e-08, 1.3517546183999998))))


solid = part_1.part
